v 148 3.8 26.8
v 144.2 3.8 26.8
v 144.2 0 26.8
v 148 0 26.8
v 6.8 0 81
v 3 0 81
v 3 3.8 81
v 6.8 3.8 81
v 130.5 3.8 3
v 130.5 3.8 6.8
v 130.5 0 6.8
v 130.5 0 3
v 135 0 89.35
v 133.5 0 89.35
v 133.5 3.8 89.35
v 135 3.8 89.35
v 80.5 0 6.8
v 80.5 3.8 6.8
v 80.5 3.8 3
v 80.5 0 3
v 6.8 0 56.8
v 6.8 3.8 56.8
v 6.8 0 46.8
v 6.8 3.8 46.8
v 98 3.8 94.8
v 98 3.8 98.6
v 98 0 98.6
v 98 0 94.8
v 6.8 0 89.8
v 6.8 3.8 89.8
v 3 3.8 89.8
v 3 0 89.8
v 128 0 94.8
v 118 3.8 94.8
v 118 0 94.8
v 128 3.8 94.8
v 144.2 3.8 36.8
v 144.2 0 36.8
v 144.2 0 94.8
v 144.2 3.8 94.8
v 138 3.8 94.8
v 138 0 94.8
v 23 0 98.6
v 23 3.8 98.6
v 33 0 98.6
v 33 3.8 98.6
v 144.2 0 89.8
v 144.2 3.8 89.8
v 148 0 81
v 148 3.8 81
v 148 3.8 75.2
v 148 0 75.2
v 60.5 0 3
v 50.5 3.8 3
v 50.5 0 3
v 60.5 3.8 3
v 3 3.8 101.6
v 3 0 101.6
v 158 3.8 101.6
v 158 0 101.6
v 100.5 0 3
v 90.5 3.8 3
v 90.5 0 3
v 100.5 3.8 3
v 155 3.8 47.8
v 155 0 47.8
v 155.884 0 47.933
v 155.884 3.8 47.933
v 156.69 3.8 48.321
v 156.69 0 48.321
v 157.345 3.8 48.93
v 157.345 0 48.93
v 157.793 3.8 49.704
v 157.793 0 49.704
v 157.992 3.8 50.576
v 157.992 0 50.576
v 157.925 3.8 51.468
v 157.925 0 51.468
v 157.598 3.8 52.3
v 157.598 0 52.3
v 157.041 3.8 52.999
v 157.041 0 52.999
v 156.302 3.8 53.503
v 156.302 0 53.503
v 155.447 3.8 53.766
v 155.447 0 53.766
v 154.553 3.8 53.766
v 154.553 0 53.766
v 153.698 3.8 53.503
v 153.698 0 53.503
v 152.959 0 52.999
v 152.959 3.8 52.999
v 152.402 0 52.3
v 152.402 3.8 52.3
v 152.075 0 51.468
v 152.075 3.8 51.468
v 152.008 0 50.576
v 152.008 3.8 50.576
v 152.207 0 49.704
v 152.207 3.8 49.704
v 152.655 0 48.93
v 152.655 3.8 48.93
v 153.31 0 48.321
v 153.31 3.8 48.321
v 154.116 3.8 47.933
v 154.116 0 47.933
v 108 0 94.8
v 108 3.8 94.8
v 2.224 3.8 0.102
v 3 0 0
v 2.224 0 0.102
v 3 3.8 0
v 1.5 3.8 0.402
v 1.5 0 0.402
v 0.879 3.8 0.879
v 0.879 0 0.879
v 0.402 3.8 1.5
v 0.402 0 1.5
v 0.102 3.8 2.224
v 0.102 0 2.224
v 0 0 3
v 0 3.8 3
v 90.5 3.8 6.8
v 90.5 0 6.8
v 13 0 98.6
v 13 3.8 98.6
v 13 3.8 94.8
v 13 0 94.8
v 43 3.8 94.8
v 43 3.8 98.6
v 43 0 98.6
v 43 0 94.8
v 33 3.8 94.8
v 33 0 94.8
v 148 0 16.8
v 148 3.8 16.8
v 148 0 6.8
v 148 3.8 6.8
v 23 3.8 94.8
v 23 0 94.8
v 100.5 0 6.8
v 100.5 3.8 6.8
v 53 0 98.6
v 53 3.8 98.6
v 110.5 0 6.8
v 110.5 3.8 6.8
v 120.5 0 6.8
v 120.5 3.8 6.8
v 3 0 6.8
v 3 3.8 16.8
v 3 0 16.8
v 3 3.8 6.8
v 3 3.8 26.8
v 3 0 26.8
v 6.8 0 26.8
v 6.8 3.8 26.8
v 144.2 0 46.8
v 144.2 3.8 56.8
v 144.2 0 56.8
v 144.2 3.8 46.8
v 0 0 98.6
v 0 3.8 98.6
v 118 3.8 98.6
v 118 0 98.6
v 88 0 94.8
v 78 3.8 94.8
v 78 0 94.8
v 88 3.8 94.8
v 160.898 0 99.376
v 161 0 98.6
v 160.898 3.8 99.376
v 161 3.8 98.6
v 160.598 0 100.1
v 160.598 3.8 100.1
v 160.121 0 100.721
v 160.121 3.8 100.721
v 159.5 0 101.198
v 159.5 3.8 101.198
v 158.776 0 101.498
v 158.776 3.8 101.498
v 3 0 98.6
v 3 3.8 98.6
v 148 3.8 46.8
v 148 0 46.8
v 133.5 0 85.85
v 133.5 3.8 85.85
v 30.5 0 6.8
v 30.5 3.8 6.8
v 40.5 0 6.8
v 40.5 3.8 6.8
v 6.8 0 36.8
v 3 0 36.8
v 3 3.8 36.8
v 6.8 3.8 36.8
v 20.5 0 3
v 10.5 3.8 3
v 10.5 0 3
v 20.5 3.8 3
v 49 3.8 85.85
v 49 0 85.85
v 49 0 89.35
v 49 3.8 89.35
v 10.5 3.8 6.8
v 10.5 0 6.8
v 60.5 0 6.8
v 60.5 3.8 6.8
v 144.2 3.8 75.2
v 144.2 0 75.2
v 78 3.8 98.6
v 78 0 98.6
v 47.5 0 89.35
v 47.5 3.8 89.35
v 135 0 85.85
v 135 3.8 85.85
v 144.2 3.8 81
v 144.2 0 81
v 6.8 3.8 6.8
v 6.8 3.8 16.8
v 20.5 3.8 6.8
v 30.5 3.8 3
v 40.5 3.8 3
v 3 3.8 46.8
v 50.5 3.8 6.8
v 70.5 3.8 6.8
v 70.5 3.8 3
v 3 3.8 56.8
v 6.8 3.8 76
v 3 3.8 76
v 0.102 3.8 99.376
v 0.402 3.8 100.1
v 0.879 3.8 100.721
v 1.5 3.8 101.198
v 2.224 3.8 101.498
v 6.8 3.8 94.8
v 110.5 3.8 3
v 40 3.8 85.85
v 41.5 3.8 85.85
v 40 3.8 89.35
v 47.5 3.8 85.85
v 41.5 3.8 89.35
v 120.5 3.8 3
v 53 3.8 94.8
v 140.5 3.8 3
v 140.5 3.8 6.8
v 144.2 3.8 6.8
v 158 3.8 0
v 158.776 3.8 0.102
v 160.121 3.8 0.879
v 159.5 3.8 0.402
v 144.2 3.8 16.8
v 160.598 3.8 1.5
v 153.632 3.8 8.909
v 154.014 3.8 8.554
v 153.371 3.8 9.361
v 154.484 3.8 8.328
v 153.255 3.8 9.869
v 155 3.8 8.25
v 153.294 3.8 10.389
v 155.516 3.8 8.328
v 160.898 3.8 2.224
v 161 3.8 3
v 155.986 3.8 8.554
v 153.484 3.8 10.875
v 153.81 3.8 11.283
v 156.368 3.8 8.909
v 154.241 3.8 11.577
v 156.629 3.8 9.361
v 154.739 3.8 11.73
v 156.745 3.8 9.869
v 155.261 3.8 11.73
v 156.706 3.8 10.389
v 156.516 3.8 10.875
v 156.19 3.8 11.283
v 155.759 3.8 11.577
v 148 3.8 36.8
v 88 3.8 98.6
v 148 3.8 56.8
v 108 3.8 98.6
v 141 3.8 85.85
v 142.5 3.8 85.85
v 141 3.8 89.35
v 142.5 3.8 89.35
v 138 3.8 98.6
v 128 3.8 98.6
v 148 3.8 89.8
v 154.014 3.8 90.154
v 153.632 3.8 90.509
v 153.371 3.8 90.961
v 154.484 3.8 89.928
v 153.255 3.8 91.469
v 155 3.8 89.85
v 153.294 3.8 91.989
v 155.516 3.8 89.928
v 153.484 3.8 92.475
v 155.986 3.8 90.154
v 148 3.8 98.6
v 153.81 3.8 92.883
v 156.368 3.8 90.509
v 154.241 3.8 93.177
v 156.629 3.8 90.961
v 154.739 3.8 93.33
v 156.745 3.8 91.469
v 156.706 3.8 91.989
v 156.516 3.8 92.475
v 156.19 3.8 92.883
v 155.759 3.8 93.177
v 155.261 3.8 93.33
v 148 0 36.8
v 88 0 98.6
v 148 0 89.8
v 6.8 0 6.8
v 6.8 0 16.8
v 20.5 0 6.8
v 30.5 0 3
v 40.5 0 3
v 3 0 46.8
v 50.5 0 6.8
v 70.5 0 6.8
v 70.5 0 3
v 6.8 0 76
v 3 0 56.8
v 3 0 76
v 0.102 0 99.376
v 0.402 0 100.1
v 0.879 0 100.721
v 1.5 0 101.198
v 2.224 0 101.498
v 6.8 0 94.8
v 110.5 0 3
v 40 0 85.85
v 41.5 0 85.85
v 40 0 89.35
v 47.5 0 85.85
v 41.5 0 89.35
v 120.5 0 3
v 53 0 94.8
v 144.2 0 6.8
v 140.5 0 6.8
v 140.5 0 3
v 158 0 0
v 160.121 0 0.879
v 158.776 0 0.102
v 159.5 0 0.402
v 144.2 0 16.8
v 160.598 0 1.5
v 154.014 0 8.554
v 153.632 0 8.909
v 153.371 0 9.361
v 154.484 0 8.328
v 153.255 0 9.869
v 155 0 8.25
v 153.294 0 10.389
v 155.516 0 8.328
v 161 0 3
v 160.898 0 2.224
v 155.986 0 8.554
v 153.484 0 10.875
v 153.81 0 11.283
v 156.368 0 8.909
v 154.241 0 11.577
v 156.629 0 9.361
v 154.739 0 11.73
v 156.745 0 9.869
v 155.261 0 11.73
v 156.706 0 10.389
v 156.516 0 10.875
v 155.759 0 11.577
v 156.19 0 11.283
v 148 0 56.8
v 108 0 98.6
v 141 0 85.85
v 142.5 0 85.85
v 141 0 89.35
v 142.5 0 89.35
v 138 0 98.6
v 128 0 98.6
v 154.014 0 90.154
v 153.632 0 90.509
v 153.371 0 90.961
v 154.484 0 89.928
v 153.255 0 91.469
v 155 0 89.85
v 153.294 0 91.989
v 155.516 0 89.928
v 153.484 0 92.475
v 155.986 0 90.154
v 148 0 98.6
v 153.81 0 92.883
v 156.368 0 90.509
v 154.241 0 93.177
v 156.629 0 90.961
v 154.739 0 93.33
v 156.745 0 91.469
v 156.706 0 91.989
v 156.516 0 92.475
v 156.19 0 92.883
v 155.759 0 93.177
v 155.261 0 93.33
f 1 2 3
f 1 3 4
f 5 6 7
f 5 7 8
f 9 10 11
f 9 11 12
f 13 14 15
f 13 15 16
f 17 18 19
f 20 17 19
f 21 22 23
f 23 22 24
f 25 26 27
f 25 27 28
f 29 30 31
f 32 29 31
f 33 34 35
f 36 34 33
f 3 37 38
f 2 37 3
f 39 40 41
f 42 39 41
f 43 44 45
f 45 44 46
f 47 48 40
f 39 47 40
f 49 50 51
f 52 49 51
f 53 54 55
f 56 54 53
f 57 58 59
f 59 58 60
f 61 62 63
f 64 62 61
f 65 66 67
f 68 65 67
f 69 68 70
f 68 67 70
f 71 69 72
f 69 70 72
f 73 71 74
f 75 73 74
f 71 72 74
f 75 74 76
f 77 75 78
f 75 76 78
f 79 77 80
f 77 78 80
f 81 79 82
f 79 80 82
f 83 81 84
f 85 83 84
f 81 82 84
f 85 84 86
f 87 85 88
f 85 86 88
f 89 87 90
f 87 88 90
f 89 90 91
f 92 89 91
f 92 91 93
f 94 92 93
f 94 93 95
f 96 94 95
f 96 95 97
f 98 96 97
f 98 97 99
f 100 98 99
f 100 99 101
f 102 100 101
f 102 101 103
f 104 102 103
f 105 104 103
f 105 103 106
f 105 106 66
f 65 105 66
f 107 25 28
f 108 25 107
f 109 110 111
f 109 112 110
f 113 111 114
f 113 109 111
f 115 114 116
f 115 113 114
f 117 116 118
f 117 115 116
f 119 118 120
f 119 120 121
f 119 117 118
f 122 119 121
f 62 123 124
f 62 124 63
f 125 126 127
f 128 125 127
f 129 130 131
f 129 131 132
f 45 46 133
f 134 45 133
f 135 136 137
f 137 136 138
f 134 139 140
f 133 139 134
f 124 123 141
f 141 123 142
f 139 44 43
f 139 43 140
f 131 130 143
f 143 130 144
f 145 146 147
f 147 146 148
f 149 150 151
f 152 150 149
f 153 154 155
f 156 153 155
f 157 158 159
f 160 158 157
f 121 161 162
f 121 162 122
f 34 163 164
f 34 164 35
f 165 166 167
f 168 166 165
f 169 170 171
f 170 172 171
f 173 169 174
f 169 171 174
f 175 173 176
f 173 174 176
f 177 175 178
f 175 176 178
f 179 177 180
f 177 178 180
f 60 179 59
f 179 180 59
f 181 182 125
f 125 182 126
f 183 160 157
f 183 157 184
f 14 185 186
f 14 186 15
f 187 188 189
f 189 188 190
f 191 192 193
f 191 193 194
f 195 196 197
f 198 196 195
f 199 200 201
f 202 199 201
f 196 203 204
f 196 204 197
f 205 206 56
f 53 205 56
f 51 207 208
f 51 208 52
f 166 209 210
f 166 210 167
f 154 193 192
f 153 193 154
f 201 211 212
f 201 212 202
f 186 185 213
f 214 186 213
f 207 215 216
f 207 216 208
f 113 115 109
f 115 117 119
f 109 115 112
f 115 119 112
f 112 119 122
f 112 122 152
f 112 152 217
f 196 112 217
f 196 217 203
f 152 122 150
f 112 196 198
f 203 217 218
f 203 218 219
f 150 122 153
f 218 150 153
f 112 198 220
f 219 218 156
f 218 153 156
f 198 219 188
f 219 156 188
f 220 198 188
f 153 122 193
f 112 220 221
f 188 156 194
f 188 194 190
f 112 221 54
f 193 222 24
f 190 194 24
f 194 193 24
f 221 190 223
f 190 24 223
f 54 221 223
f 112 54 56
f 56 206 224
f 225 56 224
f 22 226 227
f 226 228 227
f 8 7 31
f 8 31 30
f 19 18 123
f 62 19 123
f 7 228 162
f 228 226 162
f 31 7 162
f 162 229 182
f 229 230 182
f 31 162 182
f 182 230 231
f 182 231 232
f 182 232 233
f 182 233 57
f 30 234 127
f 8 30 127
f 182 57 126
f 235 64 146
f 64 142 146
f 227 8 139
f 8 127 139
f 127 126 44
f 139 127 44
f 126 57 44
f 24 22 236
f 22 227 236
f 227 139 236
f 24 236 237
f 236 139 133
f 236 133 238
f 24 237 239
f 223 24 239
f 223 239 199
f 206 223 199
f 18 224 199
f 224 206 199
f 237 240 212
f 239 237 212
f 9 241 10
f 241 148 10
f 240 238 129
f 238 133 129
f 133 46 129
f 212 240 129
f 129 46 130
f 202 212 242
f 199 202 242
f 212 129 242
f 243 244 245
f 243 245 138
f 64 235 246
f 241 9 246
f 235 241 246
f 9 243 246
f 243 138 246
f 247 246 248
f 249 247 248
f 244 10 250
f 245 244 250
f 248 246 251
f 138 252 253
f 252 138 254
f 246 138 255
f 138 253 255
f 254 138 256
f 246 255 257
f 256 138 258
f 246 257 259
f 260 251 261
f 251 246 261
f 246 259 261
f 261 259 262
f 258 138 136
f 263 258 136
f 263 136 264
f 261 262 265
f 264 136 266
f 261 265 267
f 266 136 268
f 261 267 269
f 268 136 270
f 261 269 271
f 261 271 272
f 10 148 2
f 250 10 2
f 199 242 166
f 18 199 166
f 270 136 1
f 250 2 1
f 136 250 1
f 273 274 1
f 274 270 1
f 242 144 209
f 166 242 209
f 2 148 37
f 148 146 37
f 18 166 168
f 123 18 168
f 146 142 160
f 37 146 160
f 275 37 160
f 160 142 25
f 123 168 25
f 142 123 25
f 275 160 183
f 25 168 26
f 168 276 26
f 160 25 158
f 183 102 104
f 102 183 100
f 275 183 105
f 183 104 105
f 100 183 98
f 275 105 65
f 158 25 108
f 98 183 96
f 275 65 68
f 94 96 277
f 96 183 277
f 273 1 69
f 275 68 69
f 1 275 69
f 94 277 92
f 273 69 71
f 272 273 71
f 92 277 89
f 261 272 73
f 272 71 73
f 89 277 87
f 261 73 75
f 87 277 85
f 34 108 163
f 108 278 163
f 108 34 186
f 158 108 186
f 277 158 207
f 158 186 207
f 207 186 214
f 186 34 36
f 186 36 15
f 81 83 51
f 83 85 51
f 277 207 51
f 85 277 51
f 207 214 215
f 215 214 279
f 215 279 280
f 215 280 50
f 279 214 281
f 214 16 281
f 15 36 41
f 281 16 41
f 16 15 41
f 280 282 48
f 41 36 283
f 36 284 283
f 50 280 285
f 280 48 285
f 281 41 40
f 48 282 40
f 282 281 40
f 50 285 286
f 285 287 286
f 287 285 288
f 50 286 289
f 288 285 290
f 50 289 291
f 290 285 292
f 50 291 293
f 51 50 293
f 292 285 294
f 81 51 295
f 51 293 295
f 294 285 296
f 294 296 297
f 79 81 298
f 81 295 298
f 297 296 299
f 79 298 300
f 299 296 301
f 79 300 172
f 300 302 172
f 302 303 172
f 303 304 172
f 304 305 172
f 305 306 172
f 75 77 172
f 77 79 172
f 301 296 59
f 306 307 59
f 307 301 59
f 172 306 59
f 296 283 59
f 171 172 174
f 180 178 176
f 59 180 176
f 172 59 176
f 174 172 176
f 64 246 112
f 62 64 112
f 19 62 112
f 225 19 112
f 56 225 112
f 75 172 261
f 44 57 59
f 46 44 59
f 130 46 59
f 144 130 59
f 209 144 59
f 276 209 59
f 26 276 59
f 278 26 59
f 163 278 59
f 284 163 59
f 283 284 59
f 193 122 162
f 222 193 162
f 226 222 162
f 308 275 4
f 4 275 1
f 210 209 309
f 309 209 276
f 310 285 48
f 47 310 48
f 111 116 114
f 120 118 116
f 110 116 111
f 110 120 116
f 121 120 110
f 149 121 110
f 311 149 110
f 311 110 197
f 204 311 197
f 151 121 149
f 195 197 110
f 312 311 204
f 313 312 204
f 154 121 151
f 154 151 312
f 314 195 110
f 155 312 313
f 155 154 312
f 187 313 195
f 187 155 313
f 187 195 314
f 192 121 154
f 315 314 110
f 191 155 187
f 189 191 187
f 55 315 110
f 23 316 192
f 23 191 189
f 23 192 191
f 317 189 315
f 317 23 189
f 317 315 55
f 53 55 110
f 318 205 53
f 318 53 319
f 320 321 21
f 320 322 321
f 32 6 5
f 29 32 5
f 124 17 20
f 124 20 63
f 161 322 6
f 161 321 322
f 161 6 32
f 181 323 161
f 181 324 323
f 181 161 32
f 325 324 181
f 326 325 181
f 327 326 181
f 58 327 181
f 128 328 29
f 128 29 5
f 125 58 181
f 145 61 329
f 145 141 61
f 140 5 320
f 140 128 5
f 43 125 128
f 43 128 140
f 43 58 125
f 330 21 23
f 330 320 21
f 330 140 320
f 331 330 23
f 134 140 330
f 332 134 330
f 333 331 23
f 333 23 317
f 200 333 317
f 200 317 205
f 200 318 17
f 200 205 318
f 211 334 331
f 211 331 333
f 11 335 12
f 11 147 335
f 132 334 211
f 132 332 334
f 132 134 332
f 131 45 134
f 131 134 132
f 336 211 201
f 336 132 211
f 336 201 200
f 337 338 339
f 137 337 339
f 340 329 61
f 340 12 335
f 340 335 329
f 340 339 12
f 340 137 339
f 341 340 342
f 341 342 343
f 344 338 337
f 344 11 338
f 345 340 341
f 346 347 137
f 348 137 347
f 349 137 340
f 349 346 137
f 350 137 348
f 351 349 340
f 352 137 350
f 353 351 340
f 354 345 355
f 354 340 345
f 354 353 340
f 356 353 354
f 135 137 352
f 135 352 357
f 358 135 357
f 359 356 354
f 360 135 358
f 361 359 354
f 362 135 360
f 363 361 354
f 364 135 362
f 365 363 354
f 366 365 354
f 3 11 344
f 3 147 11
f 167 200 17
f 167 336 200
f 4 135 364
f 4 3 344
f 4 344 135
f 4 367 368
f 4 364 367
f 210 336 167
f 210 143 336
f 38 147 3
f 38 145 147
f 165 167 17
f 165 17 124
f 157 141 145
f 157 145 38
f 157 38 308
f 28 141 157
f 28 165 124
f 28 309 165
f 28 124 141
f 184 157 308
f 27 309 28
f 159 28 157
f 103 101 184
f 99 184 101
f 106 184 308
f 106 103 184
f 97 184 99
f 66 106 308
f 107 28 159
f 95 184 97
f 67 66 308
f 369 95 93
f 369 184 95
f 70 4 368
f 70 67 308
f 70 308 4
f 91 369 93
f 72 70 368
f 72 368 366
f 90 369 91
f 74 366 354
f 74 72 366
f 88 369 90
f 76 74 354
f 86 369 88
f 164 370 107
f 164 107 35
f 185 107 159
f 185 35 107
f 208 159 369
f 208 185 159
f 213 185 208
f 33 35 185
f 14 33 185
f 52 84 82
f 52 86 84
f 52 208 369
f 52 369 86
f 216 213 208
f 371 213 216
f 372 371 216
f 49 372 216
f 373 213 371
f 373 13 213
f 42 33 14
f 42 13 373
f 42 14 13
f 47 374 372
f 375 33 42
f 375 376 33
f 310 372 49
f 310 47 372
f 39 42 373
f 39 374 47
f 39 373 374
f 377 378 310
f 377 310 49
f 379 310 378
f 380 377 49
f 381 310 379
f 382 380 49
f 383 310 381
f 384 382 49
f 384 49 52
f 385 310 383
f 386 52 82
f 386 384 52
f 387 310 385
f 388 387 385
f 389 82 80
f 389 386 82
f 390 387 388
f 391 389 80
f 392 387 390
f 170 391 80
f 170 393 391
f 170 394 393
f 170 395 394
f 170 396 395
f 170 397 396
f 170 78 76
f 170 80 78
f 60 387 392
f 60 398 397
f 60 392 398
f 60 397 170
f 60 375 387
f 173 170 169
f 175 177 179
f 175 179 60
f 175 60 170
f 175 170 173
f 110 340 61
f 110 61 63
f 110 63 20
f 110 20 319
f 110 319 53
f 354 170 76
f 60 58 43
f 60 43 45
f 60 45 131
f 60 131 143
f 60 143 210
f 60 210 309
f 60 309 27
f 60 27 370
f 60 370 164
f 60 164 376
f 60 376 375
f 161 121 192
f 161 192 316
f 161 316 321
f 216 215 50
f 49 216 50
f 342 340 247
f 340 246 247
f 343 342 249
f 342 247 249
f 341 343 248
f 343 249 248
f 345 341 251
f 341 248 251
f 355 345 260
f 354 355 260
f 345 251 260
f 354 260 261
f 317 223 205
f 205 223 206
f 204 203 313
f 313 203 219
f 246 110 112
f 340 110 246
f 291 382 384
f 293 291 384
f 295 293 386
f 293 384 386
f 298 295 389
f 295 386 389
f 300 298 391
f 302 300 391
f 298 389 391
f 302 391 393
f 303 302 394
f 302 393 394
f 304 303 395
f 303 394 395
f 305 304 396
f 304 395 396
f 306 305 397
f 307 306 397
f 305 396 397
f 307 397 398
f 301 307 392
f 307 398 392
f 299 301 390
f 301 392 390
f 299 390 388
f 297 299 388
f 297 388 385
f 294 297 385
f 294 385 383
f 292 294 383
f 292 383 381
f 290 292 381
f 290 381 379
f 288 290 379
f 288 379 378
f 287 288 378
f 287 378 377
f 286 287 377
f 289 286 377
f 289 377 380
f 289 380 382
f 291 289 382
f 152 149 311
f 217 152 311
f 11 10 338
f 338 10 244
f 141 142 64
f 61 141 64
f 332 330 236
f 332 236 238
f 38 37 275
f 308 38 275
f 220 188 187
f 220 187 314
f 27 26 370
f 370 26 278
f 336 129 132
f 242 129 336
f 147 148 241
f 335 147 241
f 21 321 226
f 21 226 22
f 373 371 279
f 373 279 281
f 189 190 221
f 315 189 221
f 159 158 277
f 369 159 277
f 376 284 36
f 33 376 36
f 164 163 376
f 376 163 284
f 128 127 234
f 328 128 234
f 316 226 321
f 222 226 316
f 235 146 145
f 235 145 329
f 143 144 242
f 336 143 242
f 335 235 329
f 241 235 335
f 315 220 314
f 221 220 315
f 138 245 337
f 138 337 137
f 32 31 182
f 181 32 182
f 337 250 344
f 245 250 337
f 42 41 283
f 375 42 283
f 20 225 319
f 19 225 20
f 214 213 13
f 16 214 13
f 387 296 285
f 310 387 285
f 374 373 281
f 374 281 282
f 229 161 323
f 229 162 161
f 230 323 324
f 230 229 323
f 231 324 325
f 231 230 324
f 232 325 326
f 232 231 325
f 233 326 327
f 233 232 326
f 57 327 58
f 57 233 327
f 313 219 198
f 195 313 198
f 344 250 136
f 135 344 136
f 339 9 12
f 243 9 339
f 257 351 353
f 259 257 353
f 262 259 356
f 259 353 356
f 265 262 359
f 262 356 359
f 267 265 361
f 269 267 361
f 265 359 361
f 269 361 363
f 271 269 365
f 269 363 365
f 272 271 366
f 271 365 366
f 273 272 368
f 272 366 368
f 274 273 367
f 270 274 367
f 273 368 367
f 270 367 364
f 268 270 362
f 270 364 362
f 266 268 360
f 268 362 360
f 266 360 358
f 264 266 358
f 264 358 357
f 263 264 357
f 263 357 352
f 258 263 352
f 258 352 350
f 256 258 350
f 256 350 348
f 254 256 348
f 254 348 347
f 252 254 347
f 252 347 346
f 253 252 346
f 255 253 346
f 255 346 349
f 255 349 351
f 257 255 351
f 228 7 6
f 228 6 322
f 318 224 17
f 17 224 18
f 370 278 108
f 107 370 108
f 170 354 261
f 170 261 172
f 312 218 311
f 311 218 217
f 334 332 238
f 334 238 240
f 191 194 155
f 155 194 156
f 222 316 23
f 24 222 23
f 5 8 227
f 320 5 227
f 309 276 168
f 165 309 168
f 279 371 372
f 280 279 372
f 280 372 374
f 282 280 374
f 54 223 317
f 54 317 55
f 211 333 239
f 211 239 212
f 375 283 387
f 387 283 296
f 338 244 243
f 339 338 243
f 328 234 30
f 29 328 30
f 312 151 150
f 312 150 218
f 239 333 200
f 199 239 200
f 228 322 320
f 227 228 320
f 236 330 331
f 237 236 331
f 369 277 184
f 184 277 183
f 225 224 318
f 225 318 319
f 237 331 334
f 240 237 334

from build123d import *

# Parameters (mm, degrees)
SKETCH1_W           = 151
SKETCH1_H           = 101.6
BOSS_EXTRUDE1_DEPTH = 3.8
SKETCH3_W           = 1.5
SKETCH3_H           = 3.5
CUT_EXTRUDE1_DEPTH  = 183.038457475
SKETCH4_W           = 10
SKETCH4_H           = 101.6
BOSS_EXTRUDE2_DEPTH = 3.8
SKETCH5_R           = 3
SKETCH5_R_2         = 1.75
CUT_EXTRUDE2_DEPTH  = 191.415335517
FILLET1_R           = 3
FILLET2_R           = 3
SKETCH6_W           = 3.8
SKETCH6_H           = 5.8
SKETCH6_H_2         = 10
SKETCH6_W_2         = 10
SKETCH6_H_3         = 3.8
SKETCH6_H_4         = 5
CUT_EXTRUDE3_DEPTH  = 191.415335517


with BuildPart() as part:
    # Sketch1 → Boss-Extrude1 (new body)
    with BuildSketch(Plane(origin=(0, 0, 0), x_dir=(1, 0, 0), z_dir=(0, 1, 0))):
        with Locations((75.5, -50.8)):
            Rectangle(SKETCH1_W, SKETCH1_H)
    extrude(amount=BOSS_EXTRUDE1_DEPTH)

    # Sketch3 → Cut-Extrude1 (cut, through all)
    with BuildSketch(Plane.XZ):
        with Locations((40.75, 87.6)):
            Rectangle(SKETCH3_W, SKETCH3_H)
        with Locations((48.25, 87.6)):
            Rectangle(SKETCH3_W, SKETCH3_H)
        with Locations((134.25, 87.6)):
            Rectangle(SKETCH3_W, SKETCH3_H)
        with Locations((141.75, 87.6)):
            Rectangle(SKETCH3_W, SKETCH3_H)
    extrude(amount=-CUT_EXTRUDE1_DEPTH, mode=Mode.SUBTRACT)

    # Sketch4 → Boss-Extrude2 (add, through all)
    with BuildSketch(Plane.XZ):
        with Locations((156, 50.8)):
            Rectangle(SKETCH4_W, SKETCH4_H)
    extrude(amount=-BOSS_EXTRUDE2_DEPTH)

    # Sketch5 → Cut-Extrude2 (cut, through all)
    with BuildSketch(Plane.XZ):
        with Locations(Location((155, 50.8, 0), (0, 0, 270))):
            Circle(SKETCH5_R)
        with Locations(Location((155, 91.6, 0), (0, 0, 270))):
            Circle(SKETCH5_R_2)
        with Locations(Location((155, 10, 0), (0, 0, 270))):
            Circle(SKETCH5_R_2)
    extrude(amount=-CUT_EXTRUDE2_DEPTH, mode=Mode.SUBTRACT)

    # Fillet1
    fillet1_edges = [part.edges().sort_by_distance(p)[0] for p in [
        (0, 1.9, 0),
        (0, 1.9, 101.6),
    ]]
    fillet(fillet1_edges, radius=FILLET1_R)

    # Fillet2
    fillet2_edges = [part.edges().sort_by_distance(p)[0] for p in [
        (161, 1.9, 101.6),
        (161, 1.9, 0),
    ]]
    fillet(fillet2_edges, radius=FILLET2_R)

    # Sketch6 → Cut-Extrude3 (cut, through all)
    with BuildSketch(Plane(origin=(0, 3.8, 0), x_dir=(1, 0, 0), z_dir=(0, 1, 0))):
        Polygon((148, -94), (148, -89.8), (144.2, -89.8), (144.2, -94.8), (138, -94.8), (138, -98.6), (148, -98.6), align=None)
        with Locations((146.1, -78.1)):
            Rectangle(SKETCH6_W, SKETCH6_H)
        with Locations((146.1, -51.8)):
            Rectangle(SKETCH6_W, SKETCH6_H_2)
        with Locations((146.1, -31.8)):
            Rectangle(SKETCH6_W, SKETCH6_H_2)
        with Locations((146.1, -11.8)):
            Rectangle(SKETCH6_W, SKETCH6_H_2)
        with Locations((135.5, -4.9)):
            Rectangle(SKETCH6_W_2, SKETCH6_H_3)
        with Locations((115.5, -4.9)):
            Rectangle(SKETCH6_W_2, SKETCH6_H_3)
        with Locations((95.5, -4.9)):
            Rectangle(SKETCH6_W_2, SKETCH6_H_3)
        with Locations((75.5, -4.9)):
            Rectangle(SKETCH6_W_2, SKETCH6_H_3)
        with Locations((55.5, -4.9)):
            Rectangle(SKETCH6_W_2, SKETCH6_H_3)
        with Locations((35.5, -4.9)):
            Rectangle(SKETCH6_W_2, SKETCH6_H_3)
        with Locations((15.5, -4.9)):
            Rectangle(SKETCH6_W_2, SKETCH6_H_3)
        with Locations((4.9, -11.8)):
            Rectangle(SKETCH6_W, SKETCH6_H_2)
        with Locations((4.9, -31.8)):
            Rectangle(SKETCH6_W, SKETCH6_H_2)
        with Locations((4.9, -51.8)):
            Rectangle(SKETCH6_W, SKETCH6_H_2)
        with Locations((4.9, -78.5)):
            Rectangle(SKETCH6_W, SKETCH6_H_4)
        Polygon((6.8, -94.8), (6.8, -89.8), (3, -89.8), (3, -94), (3, -98.6), (13, -98.6), (13, -94.8), align=None)
        with Locations((28, -96.7)):
            Rectangle(SKETCH6_W_2, SKETCH6_H_3)
        with Locations((48, -96.7)):
            Rectangle(SKETCH6_W_2, SKETCH6_H_3)
        with Locations((83, -96.7)):
            Rectangle(SKETCH6_W_2, SKETCH6_H_3)
        with Locations((103, -96.7)):
            Rectangle(SKETCH6_W_2, SKETCH6_H_3)
        with Locations((123, -96.7)):
            Rectangle(SKETCH6_W_2, SKETCH6_H_3)
    extrude(amount=-CUT_EXTRUDE3_DEPTH, mode=Mode.SUBTRACT)


solid = part.part
